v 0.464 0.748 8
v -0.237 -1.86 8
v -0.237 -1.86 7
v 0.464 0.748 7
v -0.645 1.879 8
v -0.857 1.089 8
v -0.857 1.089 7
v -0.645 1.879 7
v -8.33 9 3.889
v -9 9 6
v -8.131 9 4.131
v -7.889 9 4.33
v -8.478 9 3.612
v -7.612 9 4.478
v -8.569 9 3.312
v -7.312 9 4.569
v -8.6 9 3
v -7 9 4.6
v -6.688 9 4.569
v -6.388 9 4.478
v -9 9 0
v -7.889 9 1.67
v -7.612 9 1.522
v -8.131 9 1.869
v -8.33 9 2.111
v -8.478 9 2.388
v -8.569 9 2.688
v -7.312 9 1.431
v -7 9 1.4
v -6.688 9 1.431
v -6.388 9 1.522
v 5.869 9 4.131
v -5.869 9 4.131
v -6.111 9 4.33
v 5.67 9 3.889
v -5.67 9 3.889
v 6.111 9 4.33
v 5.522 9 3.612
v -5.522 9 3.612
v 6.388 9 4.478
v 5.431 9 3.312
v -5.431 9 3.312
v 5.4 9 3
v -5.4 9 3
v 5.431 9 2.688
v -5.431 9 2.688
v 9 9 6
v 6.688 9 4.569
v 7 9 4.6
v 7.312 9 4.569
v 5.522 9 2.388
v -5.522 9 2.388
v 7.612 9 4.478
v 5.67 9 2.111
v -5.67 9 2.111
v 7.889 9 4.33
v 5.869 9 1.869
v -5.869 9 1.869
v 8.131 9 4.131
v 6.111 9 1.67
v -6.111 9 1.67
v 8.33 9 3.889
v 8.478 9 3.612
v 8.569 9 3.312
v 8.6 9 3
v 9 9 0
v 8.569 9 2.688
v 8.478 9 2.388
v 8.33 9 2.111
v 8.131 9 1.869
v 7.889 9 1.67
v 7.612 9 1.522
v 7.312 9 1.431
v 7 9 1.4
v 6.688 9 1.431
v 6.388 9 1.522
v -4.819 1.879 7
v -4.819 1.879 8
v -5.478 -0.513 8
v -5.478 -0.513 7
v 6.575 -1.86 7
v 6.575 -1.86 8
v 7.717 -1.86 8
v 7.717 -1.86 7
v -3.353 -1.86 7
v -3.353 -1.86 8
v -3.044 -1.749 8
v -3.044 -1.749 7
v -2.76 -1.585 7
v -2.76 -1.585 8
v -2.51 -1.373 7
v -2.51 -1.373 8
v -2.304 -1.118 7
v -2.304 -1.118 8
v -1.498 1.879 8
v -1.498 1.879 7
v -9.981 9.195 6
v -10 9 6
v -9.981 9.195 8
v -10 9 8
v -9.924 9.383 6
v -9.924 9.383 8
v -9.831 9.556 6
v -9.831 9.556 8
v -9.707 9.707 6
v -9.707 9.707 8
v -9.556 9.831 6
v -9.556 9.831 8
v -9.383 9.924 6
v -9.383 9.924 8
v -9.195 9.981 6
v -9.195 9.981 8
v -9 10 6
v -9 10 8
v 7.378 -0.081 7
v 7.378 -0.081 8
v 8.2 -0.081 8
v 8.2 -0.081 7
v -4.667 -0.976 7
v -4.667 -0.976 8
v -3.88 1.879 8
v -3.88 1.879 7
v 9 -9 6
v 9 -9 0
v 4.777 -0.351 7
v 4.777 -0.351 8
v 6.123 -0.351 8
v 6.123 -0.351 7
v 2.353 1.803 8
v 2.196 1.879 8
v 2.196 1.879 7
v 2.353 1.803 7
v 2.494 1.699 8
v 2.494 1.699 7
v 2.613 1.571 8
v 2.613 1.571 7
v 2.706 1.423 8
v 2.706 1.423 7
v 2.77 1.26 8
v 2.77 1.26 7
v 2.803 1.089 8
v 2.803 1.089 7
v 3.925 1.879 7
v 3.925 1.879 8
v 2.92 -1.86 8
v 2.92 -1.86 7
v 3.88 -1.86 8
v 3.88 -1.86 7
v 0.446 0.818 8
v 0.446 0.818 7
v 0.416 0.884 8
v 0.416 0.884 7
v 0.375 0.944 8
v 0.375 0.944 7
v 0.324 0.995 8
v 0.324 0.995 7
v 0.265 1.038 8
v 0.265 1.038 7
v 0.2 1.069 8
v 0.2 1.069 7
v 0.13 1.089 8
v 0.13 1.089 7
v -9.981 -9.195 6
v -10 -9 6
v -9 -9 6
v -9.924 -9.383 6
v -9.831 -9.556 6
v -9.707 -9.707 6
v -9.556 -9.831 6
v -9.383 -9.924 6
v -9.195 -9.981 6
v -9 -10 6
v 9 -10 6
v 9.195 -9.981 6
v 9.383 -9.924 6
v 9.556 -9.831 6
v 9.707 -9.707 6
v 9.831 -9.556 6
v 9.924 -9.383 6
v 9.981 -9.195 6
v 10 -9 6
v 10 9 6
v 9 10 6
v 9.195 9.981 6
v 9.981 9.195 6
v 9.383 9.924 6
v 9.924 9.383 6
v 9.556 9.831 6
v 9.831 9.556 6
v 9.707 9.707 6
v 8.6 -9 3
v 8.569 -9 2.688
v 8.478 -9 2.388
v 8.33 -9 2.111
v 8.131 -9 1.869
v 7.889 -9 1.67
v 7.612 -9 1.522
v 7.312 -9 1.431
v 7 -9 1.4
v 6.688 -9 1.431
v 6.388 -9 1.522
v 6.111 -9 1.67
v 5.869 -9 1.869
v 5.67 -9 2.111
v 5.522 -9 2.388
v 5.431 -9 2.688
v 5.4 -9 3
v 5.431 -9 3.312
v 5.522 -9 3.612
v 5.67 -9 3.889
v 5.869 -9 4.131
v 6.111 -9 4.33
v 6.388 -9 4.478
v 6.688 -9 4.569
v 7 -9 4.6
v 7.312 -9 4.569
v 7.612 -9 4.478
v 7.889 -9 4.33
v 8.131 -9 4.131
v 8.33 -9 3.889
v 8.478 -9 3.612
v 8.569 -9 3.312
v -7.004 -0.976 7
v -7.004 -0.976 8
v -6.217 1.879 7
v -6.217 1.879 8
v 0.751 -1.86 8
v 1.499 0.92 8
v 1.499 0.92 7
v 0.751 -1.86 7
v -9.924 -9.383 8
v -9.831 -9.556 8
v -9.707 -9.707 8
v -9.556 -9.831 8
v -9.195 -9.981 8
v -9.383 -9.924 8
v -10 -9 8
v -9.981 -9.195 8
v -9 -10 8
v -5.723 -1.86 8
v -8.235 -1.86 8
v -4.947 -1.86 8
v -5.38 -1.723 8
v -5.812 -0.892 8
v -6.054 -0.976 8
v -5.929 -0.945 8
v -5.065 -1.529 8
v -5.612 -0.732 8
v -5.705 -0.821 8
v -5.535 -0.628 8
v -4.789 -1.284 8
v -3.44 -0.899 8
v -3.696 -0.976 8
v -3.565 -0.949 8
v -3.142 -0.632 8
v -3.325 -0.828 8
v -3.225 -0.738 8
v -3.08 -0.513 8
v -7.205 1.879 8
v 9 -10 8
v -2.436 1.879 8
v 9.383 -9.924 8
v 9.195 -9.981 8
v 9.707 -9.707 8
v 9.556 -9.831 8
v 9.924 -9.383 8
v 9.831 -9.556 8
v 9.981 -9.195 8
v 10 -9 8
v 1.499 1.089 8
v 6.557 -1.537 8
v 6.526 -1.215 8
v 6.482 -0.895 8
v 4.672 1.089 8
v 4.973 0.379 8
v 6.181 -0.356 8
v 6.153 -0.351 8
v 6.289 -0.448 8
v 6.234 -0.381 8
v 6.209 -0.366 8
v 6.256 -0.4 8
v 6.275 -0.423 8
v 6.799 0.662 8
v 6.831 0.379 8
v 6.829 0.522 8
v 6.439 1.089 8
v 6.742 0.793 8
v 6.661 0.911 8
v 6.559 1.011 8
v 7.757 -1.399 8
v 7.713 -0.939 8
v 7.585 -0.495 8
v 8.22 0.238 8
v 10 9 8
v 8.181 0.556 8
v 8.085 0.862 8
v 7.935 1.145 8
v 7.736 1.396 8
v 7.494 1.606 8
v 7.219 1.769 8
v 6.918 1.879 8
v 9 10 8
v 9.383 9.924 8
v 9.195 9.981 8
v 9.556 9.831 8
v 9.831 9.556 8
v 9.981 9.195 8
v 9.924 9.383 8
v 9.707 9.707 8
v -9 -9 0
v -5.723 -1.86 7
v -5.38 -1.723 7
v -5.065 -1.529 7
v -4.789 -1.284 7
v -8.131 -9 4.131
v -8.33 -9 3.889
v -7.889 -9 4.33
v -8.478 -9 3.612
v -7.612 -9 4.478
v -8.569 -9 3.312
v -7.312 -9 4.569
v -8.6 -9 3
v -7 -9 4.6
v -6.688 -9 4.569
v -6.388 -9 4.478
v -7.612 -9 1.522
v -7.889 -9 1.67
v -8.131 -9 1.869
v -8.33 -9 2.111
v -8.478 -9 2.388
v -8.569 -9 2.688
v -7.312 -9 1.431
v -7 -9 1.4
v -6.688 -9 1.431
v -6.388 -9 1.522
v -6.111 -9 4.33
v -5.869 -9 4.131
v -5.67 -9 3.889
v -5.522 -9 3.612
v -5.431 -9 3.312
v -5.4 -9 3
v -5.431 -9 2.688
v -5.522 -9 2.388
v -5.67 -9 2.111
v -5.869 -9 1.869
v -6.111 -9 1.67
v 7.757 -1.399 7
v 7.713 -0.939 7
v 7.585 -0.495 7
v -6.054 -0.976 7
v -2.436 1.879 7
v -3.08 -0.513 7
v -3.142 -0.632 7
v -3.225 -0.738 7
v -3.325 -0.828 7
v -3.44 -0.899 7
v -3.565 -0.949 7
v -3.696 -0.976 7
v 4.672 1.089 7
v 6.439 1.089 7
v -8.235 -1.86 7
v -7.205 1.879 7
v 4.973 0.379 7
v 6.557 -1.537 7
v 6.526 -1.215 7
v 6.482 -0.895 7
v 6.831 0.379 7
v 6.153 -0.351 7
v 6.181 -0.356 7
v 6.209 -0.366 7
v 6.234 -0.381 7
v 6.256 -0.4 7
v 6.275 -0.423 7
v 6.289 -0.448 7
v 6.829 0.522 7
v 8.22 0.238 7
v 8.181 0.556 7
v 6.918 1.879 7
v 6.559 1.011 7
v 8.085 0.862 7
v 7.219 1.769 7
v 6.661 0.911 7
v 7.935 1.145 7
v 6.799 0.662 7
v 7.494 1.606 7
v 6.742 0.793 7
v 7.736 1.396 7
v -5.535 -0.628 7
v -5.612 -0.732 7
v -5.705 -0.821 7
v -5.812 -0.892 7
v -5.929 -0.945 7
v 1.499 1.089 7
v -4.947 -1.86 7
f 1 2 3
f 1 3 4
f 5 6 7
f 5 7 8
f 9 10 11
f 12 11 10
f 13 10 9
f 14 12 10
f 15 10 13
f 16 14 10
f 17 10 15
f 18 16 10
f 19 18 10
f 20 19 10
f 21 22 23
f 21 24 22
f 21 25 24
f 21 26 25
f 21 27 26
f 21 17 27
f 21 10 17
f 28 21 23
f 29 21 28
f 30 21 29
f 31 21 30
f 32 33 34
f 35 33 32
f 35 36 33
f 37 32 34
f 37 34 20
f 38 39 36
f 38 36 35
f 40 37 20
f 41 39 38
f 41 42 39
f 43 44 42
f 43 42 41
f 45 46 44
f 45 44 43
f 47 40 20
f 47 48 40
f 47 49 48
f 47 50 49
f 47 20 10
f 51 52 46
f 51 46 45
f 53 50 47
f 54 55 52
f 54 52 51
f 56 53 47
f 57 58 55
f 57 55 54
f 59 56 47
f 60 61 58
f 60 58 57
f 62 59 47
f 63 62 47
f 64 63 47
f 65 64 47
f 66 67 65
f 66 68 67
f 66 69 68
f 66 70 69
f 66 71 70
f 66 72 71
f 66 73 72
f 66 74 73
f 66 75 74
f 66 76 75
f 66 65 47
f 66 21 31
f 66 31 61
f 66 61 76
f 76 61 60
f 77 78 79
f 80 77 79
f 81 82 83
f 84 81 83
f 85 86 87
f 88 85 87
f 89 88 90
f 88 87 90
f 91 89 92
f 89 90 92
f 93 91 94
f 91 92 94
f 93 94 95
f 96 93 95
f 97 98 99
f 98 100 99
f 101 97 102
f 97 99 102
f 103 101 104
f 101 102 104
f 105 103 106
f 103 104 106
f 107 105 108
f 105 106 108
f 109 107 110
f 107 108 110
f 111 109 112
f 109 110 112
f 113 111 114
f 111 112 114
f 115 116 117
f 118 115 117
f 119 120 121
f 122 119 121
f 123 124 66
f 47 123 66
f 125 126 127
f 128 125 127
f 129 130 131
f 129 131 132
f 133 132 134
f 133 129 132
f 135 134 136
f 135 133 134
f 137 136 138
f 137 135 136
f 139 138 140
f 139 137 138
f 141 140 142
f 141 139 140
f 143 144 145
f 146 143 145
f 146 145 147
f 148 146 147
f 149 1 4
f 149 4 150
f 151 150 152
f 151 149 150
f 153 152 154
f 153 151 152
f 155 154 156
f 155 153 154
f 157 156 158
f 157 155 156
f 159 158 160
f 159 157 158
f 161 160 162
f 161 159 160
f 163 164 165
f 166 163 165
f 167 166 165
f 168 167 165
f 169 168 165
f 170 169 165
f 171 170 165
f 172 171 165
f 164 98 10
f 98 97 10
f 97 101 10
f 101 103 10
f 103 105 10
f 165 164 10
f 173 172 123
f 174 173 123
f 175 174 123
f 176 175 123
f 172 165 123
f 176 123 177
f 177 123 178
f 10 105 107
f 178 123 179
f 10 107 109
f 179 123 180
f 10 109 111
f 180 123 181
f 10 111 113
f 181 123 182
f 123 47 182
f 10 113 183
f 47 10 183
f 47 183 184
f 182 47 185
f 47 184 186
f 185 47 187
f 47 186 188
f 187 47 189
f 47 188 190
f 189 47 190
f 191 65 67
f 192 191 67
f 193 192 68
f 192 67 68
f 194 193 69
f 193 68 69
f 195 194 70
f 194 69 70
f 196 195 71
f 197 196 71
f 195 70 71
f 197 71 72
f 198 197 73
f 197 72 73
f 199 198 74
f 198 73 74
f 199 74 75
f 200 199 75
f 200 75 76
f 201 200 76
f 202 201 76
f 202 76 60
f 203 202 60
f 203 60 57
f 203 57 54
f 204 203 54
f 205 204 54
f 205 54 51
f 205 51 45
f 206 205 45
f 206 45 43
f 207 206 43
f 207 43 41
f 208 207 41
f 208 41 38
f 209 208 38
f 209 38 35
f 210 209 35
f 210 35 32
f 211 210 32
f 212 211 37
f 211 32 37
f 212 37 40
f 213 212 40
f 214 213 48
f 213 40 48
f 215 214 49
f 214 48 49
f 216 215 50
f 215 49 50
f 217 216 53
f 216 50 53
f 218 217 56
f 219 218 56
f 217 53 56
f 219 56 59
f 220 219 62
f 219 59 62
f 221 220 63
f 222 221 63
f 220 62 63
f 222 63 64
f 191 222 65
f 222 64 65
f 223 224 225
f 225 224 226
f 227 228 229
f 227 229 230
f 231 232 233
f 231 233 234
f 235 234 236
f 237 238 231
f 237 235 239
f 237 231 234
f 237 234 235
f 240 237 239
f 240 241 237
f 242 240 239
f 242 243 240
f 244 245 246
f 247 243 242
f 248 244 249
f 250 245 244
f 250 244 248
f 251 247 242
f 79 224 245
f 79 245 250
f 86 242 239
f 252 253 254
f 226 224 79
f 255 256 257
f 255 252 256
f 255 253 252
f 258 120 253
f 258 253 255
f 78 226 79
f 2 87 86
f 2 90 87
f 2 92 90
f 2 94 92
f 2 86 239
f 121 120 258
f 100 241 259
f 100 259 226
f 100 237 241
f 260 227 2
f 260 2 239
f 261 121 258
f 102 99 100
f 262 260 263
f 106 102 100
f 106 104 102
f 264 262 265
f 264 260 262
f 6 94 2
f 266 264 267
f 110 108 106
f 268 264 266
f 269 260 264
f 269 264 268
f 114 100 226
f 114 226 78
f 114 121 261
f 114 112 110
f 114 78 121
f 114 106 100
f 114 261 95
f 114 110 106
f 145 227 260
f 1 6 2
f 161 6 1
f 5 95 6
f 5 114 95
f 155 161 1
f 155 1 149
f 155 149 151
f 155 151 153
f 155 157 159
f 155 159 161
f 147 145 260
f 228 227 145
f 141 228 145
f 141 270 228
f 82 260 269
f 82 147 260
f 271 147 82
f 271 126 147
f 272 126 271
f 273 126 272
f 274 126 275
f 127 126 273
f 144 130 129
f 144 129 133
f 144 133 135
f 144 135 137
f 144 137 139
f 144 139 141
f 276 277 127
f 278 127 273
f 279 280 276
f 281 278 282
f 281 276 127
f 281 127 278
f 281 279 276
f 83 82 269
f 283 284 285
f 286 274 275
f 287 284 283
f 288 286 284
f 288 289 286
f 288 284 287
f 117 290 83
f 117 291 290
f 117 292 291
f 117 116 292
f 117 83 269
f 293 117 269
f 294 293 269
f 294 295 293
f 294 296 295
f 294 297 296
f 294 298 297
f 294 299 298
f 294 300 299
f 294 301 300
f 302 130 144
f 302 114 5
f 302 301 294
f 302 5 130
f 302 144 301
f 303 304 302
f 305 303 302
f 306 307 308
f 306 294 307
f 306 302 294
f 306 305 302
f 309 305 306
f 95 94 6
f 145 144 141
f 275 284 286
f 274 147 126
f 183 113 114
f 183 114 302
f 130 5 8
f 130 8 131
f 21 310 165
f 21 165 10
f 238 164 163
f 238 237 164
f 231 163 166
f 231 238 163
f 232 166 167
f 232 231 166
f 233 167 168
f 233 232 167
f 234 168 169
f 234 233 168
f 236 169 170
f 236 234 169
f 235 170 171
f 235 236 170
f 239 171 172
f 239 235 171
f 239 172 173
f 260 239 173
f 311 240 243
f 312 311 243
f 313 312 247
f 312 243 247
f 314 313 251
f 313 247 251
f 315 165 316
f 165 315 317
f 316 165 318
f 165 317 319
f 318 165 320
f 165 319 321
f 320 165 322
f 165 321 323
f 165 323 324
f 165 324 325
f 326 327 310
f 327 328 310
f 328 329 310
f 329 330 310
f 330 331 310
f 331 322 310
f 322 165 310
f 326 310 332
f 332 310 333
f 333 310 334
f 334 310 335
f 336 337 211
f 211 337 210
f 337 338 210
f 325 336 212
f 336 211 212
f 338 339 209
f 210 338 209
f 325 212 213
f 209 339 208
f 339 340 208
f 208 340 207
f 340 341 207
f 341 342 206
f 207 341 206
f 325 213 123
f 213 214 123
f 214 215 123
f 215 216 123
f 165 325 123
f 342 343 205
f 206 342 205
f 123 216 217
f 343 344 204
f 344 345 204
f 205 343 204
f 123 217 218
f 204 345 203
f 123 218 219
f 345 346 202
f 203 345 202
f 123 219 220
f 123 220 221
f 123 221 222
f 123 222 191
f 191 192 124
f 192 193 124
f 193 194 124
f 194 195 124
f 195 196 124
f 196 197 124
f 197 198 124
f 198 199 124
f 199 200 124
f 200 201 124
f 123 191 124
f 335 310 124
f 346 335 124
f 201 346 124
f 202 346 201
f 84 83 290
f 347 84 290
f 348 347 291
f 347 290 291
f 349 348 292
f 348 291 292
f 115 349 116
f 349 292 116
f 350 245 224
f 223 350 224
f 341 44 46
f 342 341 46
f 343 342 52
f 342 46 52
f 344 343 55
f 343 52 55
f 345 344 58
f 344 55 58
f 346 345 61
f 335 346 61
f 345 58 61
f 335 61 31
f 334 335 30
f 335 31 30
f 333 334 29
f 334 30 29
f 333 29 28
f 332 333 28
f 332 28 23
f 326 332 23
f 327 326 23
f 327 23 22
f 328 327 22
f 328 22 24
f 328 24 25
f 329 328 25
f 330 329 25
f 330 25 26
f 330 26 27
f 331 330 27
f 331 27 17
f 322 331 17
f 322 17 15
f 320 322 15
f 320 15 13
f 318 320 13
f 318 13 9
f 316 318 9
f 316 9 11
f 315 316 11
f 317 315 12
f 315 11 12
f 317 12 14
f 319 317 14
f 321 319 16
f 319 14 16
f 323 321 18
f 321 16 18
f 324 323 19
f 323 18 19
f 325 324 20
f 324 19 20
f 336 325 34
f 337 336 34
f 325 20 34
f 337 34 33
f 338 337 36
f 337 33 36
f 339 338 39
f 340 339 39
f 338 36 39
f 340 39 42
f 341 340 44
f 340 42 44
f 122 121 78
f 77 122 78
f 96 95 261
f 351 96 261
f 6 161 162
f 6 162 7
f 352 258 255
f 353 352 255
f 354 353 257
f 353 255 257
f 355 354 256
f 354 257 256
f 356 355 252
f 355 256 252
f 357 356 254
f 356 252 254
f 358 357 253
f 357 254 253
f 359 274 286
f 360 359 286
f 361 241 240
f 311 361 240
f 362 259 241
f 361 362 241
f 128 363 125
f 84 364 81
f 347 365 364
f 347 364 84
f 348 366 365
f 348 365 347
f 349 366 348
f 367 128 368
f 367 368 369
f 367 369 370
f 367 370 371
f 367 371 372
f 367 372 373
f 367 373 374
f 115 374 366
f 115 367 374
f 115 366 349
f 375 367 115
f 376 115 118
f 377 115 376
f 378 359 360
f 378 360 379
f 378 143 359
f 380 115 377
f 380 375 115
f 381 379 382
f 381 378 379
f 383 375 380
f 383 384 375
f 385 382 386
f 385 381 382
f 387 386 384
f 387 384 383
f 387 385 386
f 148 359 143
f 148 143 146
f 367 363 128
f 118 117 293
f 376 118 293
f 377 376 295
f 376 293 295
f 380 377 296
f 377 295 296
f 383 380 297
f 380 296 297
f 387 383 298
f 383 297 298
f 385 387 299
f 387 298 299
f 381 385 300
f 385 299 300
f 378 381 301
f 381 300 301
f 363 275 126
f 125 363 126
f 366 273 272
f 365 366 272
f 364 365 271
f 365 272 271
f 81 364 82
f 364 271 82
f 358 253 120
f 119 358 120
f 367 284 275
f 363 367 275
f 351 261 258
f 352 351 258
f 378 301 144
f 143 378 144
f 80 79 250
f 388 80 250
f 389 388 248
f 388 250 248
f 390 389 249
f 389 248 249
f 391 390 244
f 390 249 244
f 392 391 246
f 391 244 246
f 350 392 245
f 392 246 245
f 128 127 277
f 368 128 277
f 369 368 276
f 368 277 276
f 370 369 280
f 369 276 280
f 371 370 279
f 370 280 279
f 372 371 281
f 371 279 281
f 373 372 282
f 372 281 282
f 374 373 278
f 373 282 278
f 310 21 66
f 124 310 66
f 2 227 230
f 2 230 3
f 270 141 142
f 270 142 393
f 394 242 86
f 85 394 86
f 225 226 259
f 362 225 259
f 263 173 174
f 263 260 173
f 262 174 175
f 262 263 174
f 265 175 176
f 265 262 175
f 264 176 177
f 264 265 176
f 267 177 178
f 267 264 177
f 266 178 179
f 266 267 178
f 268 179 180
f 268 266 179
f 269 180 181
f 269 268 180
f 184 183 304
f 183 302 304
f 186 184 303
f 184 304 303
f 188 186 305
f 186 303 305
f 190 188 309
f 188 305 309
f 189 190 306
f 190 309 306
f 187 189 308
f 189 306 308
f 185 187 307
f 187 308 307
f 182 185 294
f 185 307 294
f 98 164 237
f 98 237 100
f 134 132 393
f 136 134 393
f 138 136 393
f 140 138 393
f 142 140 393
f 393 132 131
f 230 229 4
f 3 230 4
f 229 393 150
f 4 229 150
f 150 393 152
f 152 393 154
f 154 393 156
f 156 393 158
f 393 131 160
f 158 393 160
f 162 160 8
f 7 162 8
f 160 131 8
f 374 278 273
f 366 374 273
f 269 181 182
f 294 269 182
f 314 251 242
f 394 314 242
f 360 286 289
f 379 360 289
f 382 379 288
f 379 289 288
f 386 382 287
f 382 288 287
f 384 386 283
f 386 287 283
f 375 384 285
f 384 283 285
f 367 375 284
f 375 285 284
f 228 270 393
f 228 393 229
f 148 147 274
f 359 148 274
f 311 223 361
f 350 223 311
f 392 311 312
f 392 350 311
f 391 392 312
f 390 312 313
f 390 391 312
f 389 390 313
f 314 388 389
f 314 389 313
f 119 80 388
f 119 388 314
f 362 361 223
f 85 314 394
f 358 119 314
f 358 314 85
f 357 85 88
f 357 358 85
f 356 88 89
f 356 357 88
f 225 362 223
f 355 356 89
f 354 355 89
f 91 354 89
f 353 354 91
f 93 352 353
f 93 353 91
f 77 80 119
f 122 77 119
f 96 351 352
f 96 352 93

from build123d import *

# Parameters (mm, degrees)
SKETCH_1_W          = 18
SKETCH_1_H          = 18
EXTRUDE_1_DEPTH     = 6
SKETCH_2_R          = 1.6
CUT_EXTRUDE_1_DEPTH = 19
SKETCH_3_W          = 20
SKETCH_3_H          = 20
EXTRUDE_2_DEPTH     = 2
FILLET_1_R          = 1
CUT_EXTRUDE_2_DEPTH = 1


with BuildPart() as part:
    # 草图1 → 凸台-拉伸1 (new body)
    with BuildSketch(Plane.XY):
        Rectangle(SKETCH_1_W, SKETCH_1_H)
    extrude(amount=EXTRUDE_1_DEPTH)

    # 草图2 → 切除-拉伸1 (cut, through all)
    with BuildSketch(Plane(origin=(0, 9, 0), x_dir=(1, 0, 0), z_dir=(0, 1, 0))):
        with Locations((-7, -3)):
            Circle(SKETCH_2_R)
        with Locations((7, -3)):
            Circle(SKETCH_2_R)
    extrude(amount=-CUT_EXTRUDE_1_DEPTH, mode=Mode.SUBTRACT)

    # 草图3 → 凸台-拉伸2 (add)
    with BuildSketch(Plane.XY.offset(6)):
        Rectangle(SKETCH_3_W, SKETCH_3_H)
    extrude(amount=EXTRUDE_2_DEPTH)

    # 圆角1
    fillet_1_edges = [part.edges().sort_by_distance(p)[0] for p in [
        (10, -10, 7),
        (10, 10, 7),
        (-10, 10, 7),
        (-10, -10, 7),
    ]]
    fillet(fillet_1_edges, radius=FILLET_1_R)

    # 草图5 → 切除-拉伸2 (cut)
    with BuildSketch(Plane.XY.offset(8)):
        with BuildLine():
            Line((-7.204561004, 1.879394949), (-8.234522443, -1.859506165))
            Line((-8.234522443, -1.859506165), (-5.723109619, -1.859506165))
            ThreePointArc((-5.723109619, -1.859506165), (-5.218538697, -1.632457047), (-4.78861912, -1.284157931))
            Line((-4.78861912, -1.284157931), (-4.947111275, -1.859506165))
            Line((-4.947111275, -1.859506165), (-3.352787404, -1.859506165))
            ThreePointArc((-3.352787404, -1.859506165), (-2.759972983, -1.585355224), (-2.30360072, -1.118116491))
            Line((-2.30360072, -1.118116491), (-1.497804292, 1.879394949))
            Line((-1.497804292, 1.879394949), (-2.436323584, 1.879394949))
            Line((-2.436323584, 1.879394949), (-3.079504637, -0.513197642))
            ThreePointArc((-3.079504637, -0.513197642), (-3.32542599, -0.827982147), (-3.696433402, -0.976036515))
            Line((-3.696433402, -0.976036515), (-4.666789972, -0.976036515))
            Line((-4.666789972, -0.976036515), (-3.880199418, 1.879394949))
            Line((-3.880199418, 1.879394949), (-4.81871871, 1.879394949))
            Line((-4.81871871, 1.879394949), (-5.477810253, -0.513197642))
            ThreePointArc((-5.477810253, -0.513197642), (-5.7047457, -0.820725721), (-6.053961641, -0.976036515))
            Line((-6.053961641, -0.976036515), (-7.003517302, -0.976036515))
            Line((-7.003517302, -0.976036515), (-6.216926747, 1.879394949))
            Line((-6.216926747, 1.879394949), (-7.204561004, 1.879394949))
        make_face()
        with BuildLine():
            Line((-0.857127264, 1.088853082), (-0.644612375, 1.879394949))
            Line((-0.644612375, 1.879394949), (2.196209614, 1.879394949))
            ThreePointArc((2.196209614, 1.879394949), (2.612575491, 1.570775142), (2.803252851, 1.088853082))
            Line((2.803252851, 1.088853082), (1.498562909, 1.088853082))
            Line((1.498562909, 1.088853082), (1.498562909, 0.920146657))
            Line((1.498562909, 0.920146657), (0.751331627, -1.859506165))
            Line((0.751331627, -1.859506165), (-0.236975463, -1.859506165))
            Line((-0.236975463, -1.859506165), (0.463990432, 0.748042361))
            ThreePointArc((0.463990432, 0.748042361), (0.35056842, 0.970657535), (0.130450539, 1.088853082))
            Line((0.130450539, 1.088853082), (-0.857127264, 1.088853082))
        make_face()
        with BuildLine():
            Line((3.92496477, 1.879394949), (2.919866632, -1.859506165))
            Line((2.919866632, -1.859506165), (3.879786702, -1.859506165))
            Line((3.879786702, -1.859506165), (4.67236995, 1.088853082))
            Line((4.67236995, 1.088853082), (6.439189541, 1.088853082))
            ThreePointArc((6.439189541, 1.088853082), (6.74191311, 0.79302609), (6.831437365, 0.379334689))
            Line((6.831437365, 0.379334689), (4.973337874, 0.379334689))
            Line((4.973337874, 0.379334689), (4.777076341, -0.350745725))
            Line((4.777076341, -0.350745725), (6.123295998, -0.350745725))
            ThreePointArc((6.123295998, -0.350745725), (6.221884558, -0.372626448), (6.288711068, -0.448340962))
            Line((6.288711068, -0.448340962), (6.481965147, -0.894824524))
            ThreePointArc((6.481965147, -0.894824524), (6.543334906, -1.375731382), (6.574951556, -1.859506165))
            Line((6.574951556, -1.859506165), (7.717356009, -1.859506165))
            ThreePointArc((7.717356009, -1.859506165), (7.71253802, -0.938991532), (7.378394237, -0.081251283))
            Line((7.378394237, -0.081251283), (8.199786702, -0.081251283))
            ThreePointArc((8.199786702, -0.081251283), (7.934816182, 1.144935193), (6.917805112, 1.879394949))
            Line((6.917805112, 1.879394949), (3.92496477, 1.879394949))
        make_face()
    extrude(amount=-CUT_EXTRUDE_2_DEPTH, mode=Mode.SUBTRACT)


solid = part.part
